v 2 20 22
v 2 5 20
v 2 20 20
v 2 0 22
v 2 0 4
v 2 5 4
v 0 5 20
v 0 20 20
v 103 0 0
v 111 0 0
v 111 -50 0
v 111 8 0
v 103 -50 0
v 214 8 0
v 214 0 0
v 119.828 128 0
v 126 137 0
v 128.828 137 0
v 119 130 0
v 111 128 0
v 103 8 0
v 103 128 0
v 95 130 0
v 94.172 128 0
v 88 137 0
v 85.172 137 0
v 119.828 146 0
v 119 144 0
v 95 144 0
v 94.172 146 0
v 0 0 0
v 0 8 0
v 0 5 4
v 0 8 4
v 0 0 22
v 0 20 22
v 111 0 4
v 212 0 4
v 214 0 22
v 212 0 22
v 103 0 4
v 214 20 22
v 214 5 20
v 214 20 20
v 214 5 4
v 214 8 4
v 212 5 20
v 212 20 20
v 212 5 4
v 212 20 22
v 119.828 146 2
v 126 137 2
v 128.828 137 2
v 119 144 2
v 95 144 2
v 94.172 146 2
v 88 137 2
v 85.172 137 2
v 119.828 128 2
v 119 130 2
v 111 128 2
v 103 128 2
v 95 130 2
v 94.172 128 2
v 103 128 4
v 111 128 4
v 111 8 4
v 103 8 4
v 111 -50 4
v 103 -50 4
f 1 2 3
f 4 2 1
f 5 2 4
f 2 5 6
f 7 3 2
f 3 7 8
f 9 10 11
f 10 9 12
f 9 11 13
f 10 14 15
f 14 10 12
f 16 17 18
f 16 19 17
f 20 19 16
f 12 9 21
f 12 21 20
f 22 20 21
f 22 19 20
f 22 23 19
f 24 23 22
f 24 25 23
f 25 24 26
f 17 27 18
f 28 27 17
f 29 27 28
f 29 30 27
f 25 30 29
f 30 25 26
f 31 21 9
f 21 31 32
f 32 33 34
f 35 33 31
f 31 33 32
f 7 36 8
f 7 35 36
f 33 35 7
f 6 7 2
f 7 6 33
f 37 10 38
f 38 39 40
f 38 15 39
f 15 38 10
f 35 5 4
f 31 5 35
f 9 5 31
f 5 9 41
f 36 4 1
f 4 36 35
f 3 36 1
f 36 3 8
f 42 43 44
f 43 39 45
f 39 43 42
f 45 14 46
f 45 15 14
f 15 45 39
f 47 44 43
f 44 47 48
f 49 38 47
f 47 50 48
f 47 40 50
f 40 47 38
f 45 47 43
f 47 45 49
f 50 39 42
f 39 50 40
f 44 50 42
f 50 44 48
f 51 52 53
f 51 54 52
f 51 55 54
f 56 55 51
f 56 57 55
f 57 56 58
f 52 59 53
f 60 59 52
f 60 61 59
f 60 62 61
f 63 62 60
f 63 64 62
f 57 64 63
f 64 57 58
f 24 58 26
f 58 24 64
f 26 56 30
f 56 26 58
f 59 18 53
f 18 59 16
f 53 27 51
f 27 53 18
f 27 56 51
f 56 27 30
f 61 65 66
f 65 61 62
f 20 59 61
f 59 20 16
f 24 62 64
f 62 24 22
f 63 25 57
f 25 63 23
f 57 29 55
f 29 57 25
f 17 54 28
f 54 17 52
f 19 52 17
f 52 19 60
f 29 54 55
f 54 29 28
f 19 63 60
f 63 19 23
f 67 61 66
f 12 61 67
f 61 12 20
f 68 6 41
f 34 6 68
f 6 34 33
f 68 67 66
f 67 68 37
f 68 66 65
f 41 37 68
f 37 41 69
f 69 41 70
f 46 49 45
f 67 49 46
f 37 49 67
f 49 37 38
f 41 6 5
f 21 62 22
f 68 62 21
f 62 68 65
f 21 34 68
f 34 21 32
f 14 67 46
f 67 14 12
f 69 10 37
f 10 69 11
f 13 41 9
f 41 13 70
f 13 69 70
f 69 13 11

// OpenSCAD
// file: components/plug_hole.scad
module figure(len_x, len_y, len_z) {
  union() {
    square_x = len_y / sqrt(2);
    square_z = len_z;

    translate([len_y / 2, 0, 0])
    rotate(a = 45, v = [0, 0, 1])
    cube([square_x, square_x, len_z]);

    translate([len_x - len_y / 2, 0, 0])
    rotate(a = 45, v = [0, 0, 1])
    cube([square_x, square_x, len_z]);

    translate([len_y / 2, 0, 0])
    cube([len_x - len_y, len_y, len_z]);
  }
}

hole_inner_width_mm = 38;
hole_inner_height_mm = 14;

function fn_hole_outer_width(border_thickness) = hole_inner_width_mm + border_thickness * 2 * sqrt(2);

module plug_hole(border_thickness = 2, depth = 2, thin = true) {

  border_x_mm = border_thickness * sqrt(2);
  border_y_mm = border_thickness;

  difference() {
    if (thin) {
      figure(hole_inner_width_mm + 2 * border_x_mm, hole_inner_height_mm + 2 * border_y_mm, depth);
    } else {
      cube([hole_inner_width_mm + 2 * border_x_mm, hole_inner_height_mm + 2 * border_y_mm, depth]);
    }


    translate([border_x_mm, border_y_mm, 0])
    figure(hole_inner_width_mm, hole_inner_height_mm, depth);
  }
}
// main file
include <./components/plug_hole.scad>

base_thickness_mm = 4;

router_width_mm = 210;
base_height_mm = 8;

hook_thickness_mm = 2;
hook_depth_mm = 20;
hook_min_height_mm = 5;
hook_height_mm = 20;

hole_border_thickness_mm = 2;
hole_outer_width = fn_hole_outer_width(hole_border_thickness_mm);

neck_length_mm = 120;
neck_width_mm = base_height_mm;

spine_length_mm = 50;
spine_width_mm = base_height_mm;

module hook() {
  cube([hook_thickness_mm, hook_min_height_mm, hook_depth_mm]);

  translate([0, 0, hook_depth_mm]) 
  cube([hook_thickness_mm, hook_height_mm, hook_thickness_mm]); 
}

module handle() {
  translate([hole_outer_width / 2 - neck_width_mm / 2, 0, 0])
  cube([neck_width_mm, neck_length_mm, base_thickness_mm]);

  translate([0, neck_length_mm, 0])
  plug_hole(border_thickness = 2, depth = 2);
}

union() {
  // BASE
  base_width = router_width_mm + hook_thickness_mm * 2;
  
  cube([base_width, base_height_mm, base_thickness_mm]);

  // HOOKS
  translate([0, 0, 0])
  hook();

  translate([base_width - hook_thickness_mm, 0, 0])
  hook();

  // HANDLE
  handle_offset_x = (base_width - hole_outer_width) / 2; 

  translate([handle_offset_x, base_height_mm, 0])
  handle();

  // SPINE

  spine_offset_x = (router_width_mm + 2 * hook_thickness_mm - spine_width_mm) / 2;

  translate([spine_offset_x, 0, 0])
  mirror([0, 1, 0])
  cube([spine_width_mm, spine_length_mm, base_thickness_mm]);
}
